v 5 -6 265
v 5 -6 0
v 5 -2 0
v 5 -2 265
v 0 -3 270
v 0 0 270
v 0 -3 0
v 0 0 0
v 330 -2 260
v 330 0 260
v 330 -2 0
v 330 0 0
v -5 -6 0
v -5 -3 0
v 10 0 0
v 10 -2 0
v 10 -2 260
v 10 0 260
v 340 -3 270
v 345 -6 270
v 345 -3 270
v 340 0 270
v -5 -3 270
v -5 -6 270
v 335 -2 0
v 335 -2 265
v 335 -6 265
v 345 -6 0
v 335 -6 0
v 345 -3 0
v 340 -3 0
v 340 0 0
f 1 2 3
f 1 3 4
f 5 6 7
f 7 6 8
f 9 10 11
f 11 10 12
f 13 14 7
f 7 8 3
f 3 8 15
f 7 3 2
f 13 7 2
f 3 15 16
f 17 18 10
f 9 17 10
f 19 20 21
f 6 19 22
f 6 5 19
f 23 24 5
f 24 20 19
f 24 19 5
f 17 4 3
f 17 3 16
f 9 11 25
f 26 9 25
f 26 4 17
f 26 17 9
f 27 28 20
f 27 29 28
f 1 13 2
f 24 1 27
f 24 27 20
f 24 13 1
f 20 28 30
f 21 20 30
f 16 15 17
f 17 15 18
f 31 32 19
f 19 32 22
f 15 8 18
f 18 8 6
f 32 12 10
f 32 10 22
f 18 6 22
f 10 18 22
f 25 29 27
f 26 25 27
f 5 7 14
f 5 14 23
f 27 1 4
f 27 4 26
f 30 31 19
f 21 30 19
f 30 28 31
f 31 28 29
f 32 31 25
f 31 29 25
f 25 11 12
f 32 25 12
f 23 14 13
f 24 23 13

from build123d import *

# Parameters (mm, degrees)
F1_DEPTH = 6
F2_W     = 330
F2_H     = 265
F3_DEPTH = 4
F4_W     = 3
F4_H     = 270
F5_DEPTH = 5
F6_W     = 3
F6_H     = 270
F7_DEPTH = 5


with BuildPart() as f1:
    # F0 (on Front) → F1 (new body)
    with BuildSketch(Plane.XZ):
        Polygon((0, 270), (0, 0), (10, 0), (10, 260), (330, 260), (330, 0), (340, 0), (340, 270), align=None)
    extrude(amount=F1_DEPTH)

    # F2 (on face) → F3 (cut)
    with BuildSketch(Plane.XZ.offset(6)):
        with Locations((170, 132.5)):
            Rectangle(F2_W, F2_H)
    extrude(amount=-F3_DEPTH, mode=Mode.SUBTRACT)

    # F4 (on face) → F5 (join)
    with BuildSketch(Plane(origin=(0, 0, 0), x_dir=(0, -1, 0), z_dir=(-1, 0, 0))):
        with Locations((4.5, 135)):
            Rectangle(F4_W, F4_H)
    extrude(amount=F5_DEPTH)

    # F6 (on face) → F7 (join)
    with BuildSketch(Plane.YZ.offset(340)):
        with Locations((-4.5, 135)):
            Rectangle(F6_W, F6_H)
    extrude(amount=F7_DEPTH)


solid = f1.part
